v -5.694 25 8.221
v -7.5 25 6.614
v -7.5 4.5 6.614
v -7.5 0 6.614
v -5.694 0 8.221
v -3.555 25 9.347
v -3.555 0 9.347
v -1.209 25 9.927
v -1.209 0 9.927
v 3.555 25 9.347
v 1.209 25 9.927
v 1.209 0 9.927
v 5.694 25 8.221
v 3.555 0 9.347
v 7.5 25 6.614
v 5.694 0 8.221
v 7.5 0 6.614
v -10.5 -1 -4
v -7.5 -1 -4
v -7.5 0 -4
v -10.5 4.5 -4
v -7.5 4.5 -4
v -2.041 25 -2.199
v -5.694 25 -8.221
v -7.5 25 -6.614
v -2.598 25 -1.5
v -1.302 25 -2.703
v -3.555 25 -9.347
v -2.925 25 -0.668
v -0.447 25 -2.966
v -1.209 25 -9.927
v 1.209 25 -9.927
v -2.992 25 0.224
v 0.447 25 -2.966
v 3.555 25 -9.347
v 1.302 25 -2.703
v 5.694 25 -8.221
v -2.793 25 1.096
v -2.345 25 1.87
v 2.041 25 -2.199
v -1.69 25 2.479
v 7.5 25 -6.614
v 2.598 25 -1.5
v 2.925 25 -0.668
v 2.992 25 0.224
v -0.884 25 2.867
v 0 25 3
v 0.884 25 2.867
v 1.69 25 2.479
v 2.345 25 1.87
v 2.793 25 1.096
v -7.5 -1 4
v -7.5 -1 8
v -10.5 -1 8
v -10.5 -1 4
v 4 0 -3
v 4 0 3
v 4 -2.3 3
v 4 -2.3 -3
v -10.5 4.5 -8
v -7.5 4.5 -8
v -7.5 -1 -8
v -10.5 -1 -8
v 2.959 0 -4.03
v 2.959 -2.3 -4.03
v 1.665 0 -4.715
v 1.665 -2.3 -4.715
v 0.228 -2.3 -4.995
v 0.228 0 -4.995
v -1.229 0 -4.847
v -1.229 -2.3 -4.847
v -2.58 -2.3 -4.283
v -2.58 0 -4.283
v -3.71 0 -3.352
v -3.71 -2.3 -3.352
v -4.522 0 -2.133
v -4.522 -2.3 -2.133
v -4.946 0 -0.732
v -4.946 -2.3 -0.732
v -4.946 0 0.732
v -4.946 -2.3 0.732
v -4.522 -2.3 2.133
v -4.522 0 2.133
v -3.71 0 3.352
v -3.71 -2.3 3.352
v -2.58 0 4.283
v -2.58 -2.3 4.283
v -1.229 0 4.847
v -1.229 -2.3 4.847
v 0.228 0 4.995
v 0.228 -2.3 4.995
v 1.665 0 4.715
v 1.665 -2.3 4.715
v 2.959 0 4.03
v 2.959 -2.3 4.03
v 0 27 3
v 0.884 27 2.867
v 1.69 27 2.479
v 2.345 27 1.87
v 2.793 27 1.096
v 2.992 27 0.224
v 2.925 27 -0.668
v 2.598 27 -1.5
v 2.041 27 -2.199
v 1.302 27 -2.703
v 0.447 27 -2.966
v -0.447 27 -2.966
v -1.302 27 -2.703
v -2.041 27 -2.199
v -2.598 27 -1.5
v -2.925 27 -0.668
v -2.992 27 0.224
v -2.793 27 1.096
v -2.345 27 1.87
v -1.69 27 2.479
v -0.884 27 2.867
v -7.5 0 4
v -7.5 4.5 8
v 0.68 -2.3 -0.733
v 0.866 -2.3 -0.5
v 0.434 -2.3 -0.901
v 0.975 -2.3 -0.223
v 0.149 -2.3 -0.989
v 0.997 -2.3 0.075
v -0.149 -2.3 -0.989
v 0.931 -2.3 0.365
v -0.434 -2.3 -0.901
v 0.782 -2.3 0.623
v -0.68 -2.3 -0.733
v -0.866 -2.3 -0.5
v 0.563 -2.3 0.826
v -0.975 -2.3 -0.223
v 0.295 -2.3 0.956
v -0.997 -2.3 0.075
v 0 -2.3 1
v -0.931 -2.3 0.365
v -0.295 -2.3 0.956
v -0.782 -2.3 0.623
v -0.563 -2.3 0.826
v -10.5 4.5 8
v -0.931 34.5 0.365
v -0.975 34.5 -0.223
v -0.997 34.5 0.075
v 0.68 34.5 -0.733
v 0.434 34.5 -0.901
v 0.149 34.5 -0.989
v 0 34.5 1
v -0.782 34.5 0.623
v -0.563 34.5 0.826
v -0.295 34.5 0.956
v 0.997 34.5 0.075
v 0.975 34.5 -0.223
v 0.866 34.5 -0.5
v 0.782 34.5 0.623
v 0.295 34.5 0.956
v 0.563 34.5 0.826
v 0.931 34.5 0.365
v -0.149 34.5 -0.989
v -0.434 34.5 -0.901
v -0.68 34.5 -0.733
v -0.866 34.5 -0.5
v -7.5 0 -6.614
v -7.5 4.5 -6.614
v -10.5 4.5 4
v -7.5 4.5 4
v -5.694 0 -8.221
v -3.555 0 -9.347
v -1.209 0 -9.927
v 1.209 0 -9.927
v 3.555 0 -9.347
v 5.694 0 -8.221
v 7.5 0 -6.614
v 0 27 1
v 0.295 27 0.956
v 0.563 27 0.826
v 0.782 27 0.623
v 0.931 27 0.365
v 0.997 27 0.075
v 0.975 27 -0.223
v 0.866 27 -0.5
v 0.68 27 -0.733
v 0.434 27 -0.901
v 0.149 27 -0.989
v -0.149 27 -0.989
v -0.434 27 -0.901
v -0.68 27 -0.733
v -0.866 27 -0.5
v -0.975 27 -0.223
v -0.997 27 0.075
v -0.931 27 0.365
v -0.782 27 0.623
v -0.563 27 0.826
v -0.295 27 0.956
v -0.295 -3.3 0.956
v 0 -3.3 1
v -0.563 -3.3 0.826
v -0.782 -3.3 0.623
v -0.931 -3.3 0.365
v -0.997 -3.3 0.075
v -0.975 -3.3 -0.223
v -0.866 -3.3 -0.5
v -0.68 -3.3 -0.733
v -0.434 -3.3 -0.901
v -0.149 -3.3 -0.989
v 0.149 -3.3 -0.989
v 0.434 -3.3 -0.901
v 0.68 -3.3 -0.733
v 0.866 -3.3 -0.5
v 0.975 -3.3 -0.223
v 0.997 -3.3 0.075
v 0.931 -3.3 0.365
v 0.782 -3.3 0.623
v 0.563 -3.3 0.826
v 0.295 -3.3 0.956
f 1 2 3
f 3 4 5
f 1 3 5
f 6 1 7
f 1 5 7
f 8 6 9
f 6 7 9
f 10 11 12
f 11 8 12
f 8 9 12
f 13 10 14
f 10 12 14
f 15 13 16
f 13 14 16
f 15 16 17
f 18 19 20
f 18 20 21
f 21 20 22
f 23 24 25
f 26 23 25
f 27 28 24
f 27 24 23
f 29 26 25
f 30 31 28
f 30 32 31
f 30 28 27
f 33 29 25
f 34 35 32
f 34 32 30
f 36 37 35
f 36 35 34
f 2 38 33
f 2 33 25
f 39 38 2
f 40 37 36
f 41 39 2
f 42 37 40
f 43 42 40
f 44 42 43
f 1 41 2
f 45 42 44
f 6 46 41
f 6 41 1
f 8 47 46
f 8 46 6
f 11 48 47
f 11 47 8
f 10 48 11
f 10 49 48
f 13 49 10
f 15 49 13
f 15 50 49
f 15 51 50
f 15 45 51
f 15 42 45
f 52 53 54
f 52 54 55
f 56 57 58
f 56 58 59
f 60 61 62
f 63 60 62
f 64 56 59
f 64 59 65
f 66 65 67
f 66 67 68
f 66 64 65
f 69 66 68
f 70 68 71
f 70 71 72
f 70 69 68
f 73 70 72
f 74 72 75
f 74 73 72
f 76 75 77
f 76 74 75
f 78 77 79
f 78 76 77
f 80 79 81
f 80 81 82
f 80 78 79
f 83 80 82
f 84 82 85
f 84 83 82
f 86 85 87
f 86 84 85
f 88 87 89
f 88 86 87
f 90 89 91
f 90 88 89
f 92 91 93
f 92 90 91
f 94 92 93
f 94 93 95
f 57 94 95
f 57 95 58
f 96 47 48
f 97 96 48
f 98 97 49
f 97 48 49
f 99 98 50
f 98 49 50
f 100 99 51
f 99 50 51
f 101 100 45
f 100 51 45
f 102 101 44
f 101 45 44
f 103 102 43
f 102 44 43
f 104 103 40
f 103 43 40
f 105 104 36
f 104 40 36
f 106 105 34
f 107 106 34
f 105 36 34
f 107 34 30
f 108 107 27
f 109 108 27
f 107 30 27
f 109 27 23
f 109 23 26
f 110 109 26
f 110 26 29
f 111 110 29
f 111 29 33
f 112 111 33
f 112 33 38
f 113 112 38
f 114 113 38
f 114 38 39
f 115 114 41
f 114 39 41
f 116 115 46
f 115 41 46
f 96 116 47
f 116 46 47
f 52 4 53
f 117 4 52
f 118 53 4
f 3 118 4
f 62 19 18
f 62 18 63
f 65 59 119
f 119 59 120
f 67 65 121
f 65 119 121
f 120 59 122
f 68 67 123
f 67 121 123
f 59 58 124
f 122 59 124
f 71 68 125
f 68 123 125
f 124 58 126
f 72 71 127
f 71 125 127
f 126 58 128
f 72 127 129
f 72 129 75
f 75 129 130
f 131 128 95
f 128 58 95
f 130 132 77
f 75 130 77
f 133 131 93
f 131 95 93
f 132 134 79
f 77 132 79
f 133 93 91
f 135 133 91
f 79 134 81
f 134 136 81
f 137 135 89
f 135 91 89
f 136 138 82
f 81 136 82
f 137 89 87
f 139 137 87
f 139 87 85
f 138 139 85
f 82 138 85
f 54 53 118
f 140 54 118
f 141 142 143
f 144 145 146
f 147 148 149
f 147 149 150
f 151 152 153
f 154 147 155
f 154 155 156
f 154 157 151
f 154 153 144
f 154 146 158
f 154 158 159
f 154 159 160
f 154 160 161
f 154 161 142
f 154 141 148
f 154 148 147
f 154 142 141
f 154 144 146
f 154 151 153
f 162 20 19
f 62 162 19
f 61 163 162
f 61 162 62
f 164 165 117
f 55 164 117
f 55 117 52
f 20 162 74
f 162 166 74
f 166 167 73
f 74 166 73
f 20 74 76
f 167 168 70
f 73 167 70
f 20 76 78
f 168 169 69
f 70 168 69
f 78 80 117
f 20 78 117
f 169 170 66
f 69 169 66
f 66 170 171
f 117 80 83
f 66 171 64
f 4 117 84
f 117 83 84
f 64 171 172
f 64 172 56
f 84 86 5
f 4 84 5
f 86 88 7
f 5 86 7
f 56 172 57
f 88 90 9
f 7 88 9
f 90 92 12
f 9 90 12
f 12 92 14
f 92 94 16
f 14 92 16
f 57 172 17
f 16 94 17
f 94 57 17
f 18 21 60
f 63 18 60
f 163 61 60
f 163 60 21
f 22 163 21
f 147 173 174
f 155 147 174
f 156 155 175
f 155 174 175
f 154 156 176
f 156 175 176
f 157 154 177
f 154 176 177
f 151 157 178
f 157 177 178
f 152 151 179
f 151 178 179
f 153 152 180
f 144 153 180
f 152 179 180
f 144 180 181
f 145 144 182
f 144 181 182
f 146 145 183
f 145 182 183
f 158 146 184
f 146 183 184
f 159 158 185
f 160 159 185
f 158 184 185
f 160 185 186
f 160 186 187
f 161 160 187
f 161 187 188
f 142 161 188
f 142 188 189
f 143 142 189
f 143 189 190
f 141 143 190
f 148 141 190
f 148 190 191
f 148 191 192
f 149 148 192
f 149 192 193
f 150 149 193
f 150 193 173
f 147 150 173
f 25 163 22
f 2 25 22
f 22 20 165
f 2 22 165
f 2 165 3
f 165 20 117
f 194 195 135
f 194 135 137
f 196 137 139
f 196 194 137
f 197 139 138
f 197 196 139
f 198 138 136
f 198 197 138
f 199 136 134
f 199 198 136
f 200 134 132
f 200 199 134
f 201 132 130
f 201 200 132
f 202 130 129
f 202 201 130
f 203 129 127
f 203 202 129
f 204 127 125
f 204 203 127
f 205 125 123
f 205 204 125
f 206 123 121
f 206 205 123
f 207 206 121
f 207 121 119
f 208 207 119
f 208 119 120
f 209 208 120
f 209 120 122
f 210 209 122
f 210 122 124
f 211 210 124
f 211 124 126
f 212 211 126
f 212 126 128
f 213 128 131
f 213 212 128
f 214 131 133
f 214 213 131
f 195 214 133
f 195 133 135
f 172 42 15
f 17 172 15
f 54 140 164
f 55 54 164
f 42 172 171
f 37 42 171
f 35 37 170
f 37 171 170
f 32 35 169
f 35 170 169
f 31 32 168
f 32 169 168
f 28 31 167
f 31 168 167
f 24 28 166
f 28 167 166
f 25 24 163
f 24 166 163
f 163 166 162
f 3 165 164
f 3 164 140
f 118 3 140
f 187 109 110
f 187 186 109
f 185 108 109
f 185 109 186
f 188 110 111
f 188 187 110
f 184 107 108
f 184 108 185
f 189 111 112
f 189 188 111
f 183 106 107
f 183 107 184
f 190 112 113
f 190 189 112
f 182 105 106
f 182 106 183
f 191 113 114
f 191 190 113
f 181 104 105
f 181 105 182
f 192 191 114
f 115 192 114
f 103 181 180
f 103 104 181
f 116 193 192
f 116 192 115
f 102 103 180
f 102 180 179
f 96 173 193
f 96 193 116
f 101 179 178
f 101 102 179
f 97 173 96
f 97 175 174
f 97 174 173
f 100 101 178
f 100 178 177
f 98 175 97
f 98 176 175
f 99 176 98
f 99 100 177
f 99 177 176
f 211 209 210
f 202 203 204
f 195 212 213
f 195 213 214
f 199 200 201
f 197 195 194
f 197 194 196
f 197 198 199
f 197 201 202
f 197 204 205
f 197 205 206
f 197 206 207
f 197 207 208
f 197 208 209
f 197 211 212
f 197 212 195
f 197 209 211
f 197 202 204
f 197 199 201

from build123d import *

# Parameters (mm, degrees)
SKETCH_1_R            = 10
EXTRUDE_1_DEPTH       = 25
CUT_EXTRUDE_2_1_REACH = 30.723
SKETCH_2_W            = 2.5
SKETCH_2_H            = 20
SKETCH_3_R            = 3
EXTRUDE_2_DEPTH       = 2
EXTRUDE_START         = -2
SKETCH_4_R            = 1
EXTRUDE_3_DEPTH       = 9.5
EXTRUDE_START_2       = -25
EXTRUDE_4_DEPTH       = 27.3
EXTRUDE_START_3       = 1
SKETCH_6_R            = 1
EXTRUDE_5_DEPTH       = 1
EXTRUDE_6_DEPTH       = 3


with BuildPart() as part:
    # 草图1 → 圆柱凸台-拉伸1 (new body)
    with BuildSketch(Plane(origin=(0, 0, 0), x_dir=(1, 0, 0), z_dir=(0, 1, 0))):
        with Locations(Location((0, 0, 0), (0, 0, 270))):
            Circle(SKETCH_1_R)
    extrude(amount=EXTRUDE_1_DEPTH)

    # 草图2 → 2边切除切除-拉伸1 (cut, up to next)
    with BuildSketch(Plane.XZ, mode=Mode.PRIVATE) as cut_extrude_2_1_sk1:
        with Locations((-8.75, 0)):
            Rectangle(SKETCH_2_W, SKETCH_2_H)
    cut_extrude_2_1_tool1 = extrude(cut_extrude_2_1_sk1.sketch, amount=-CUT_EXTRUDE_2_1_REACH, mode=Mode.PRIVATE) & part.part
    # 草图2 → 2边切除切除-拉伸1 (cut, up to next)
    with BuildSketch(Plane.XZ, mode=Mode.PRIVATE) as cut_extrude_2_1_sk2:
        with Locations((8.75, 0)):
            Rectangle(SKETCH_2_W, SKETCH_2_H)
    cut_extrude_2_1_tool2 = extrude(cut_extrude_2_1_sk2.sketch, amount=-CUT_EXTRUDE_2_1_REACH, mode=Mode.PRIVATE) & part.part
    add(cut_extrude_2_1_tool1.solids().sort_by_distance((-8.75, 0, 0))[0], mode=Mode.SUBTRACT)
    add(cut_extrude_2_1_tool2.solids().sort_by_distance((8.75, 0, 0))[0], mode=Mode.SUBTRACT)

    # 草图3 → 前转凸台-拉伸2 (add)
    with BuildSketch(Plane(origin=(0, 25, 0), x_dir=(1, 0, 0), z_dir=(0, 1, 0))):
        with Locations(Location((0, 0, 0), (0, 0, 270))):
            Circle(SKETCH_3_R)
    extrude(amount=EXTRUDE_2_DEPTH)

    # 草图4 → 前转杆凸台-拉伸3 (add)
    with BuildSketch(Plane(origin=(0, 27, 0), x_dir=(1, 0, 0), z_dir=(0, 1, 0)).offset(EXTRUDE_START)):
        with Locations(Location((0, 0, 0), (0, 0, 270))):
            Circle(SKETCH_4_R)
    extrude(amount=EXTRUDE_3_DEPTH)

    # 草图5 → 后转凸台-拉伸4 (add)
    with BuildSketch(Plane.XZ.offset(EXTRUDE_START_2)):
        with BuildLine():
            Line((4, 3), (4, -3))
            ThreePointArc((4, -3), (-5, 0), (4, 3))
        make_face()
    extrude(amount=EXTRUDE_4_DEPTH)

    # 草图6 → 后转杆凸台-拉伸5 (add)
    with BuildSketch(Plane.XZ.offset(2.3).offset(EXTRUDE_START_3)):
        with Locations(Location((0, 0, 0), (0, 0, 90))):
            Circle(SKETCH_6_R)
    extrude(amount=-EXTRUDE_5_DEPTH)

    # 草图7 → 引线凸台-拉伸6 (add)
    with BuildSketch(Plane.ZY.offset(7.5)):
        Polygon((-8, 3), (-8, 4.5), (-4, 4.5), (-4, 3), (-4, -1), (-8, -1), align=None)
        Polygon((8, 3), (8, -1), (4, -1), (4, 3), (4, 4.5), (8, 4.5), align=None)
    extrude(amount=EXTRUDE_6_DEPTH)


solid = part.part
